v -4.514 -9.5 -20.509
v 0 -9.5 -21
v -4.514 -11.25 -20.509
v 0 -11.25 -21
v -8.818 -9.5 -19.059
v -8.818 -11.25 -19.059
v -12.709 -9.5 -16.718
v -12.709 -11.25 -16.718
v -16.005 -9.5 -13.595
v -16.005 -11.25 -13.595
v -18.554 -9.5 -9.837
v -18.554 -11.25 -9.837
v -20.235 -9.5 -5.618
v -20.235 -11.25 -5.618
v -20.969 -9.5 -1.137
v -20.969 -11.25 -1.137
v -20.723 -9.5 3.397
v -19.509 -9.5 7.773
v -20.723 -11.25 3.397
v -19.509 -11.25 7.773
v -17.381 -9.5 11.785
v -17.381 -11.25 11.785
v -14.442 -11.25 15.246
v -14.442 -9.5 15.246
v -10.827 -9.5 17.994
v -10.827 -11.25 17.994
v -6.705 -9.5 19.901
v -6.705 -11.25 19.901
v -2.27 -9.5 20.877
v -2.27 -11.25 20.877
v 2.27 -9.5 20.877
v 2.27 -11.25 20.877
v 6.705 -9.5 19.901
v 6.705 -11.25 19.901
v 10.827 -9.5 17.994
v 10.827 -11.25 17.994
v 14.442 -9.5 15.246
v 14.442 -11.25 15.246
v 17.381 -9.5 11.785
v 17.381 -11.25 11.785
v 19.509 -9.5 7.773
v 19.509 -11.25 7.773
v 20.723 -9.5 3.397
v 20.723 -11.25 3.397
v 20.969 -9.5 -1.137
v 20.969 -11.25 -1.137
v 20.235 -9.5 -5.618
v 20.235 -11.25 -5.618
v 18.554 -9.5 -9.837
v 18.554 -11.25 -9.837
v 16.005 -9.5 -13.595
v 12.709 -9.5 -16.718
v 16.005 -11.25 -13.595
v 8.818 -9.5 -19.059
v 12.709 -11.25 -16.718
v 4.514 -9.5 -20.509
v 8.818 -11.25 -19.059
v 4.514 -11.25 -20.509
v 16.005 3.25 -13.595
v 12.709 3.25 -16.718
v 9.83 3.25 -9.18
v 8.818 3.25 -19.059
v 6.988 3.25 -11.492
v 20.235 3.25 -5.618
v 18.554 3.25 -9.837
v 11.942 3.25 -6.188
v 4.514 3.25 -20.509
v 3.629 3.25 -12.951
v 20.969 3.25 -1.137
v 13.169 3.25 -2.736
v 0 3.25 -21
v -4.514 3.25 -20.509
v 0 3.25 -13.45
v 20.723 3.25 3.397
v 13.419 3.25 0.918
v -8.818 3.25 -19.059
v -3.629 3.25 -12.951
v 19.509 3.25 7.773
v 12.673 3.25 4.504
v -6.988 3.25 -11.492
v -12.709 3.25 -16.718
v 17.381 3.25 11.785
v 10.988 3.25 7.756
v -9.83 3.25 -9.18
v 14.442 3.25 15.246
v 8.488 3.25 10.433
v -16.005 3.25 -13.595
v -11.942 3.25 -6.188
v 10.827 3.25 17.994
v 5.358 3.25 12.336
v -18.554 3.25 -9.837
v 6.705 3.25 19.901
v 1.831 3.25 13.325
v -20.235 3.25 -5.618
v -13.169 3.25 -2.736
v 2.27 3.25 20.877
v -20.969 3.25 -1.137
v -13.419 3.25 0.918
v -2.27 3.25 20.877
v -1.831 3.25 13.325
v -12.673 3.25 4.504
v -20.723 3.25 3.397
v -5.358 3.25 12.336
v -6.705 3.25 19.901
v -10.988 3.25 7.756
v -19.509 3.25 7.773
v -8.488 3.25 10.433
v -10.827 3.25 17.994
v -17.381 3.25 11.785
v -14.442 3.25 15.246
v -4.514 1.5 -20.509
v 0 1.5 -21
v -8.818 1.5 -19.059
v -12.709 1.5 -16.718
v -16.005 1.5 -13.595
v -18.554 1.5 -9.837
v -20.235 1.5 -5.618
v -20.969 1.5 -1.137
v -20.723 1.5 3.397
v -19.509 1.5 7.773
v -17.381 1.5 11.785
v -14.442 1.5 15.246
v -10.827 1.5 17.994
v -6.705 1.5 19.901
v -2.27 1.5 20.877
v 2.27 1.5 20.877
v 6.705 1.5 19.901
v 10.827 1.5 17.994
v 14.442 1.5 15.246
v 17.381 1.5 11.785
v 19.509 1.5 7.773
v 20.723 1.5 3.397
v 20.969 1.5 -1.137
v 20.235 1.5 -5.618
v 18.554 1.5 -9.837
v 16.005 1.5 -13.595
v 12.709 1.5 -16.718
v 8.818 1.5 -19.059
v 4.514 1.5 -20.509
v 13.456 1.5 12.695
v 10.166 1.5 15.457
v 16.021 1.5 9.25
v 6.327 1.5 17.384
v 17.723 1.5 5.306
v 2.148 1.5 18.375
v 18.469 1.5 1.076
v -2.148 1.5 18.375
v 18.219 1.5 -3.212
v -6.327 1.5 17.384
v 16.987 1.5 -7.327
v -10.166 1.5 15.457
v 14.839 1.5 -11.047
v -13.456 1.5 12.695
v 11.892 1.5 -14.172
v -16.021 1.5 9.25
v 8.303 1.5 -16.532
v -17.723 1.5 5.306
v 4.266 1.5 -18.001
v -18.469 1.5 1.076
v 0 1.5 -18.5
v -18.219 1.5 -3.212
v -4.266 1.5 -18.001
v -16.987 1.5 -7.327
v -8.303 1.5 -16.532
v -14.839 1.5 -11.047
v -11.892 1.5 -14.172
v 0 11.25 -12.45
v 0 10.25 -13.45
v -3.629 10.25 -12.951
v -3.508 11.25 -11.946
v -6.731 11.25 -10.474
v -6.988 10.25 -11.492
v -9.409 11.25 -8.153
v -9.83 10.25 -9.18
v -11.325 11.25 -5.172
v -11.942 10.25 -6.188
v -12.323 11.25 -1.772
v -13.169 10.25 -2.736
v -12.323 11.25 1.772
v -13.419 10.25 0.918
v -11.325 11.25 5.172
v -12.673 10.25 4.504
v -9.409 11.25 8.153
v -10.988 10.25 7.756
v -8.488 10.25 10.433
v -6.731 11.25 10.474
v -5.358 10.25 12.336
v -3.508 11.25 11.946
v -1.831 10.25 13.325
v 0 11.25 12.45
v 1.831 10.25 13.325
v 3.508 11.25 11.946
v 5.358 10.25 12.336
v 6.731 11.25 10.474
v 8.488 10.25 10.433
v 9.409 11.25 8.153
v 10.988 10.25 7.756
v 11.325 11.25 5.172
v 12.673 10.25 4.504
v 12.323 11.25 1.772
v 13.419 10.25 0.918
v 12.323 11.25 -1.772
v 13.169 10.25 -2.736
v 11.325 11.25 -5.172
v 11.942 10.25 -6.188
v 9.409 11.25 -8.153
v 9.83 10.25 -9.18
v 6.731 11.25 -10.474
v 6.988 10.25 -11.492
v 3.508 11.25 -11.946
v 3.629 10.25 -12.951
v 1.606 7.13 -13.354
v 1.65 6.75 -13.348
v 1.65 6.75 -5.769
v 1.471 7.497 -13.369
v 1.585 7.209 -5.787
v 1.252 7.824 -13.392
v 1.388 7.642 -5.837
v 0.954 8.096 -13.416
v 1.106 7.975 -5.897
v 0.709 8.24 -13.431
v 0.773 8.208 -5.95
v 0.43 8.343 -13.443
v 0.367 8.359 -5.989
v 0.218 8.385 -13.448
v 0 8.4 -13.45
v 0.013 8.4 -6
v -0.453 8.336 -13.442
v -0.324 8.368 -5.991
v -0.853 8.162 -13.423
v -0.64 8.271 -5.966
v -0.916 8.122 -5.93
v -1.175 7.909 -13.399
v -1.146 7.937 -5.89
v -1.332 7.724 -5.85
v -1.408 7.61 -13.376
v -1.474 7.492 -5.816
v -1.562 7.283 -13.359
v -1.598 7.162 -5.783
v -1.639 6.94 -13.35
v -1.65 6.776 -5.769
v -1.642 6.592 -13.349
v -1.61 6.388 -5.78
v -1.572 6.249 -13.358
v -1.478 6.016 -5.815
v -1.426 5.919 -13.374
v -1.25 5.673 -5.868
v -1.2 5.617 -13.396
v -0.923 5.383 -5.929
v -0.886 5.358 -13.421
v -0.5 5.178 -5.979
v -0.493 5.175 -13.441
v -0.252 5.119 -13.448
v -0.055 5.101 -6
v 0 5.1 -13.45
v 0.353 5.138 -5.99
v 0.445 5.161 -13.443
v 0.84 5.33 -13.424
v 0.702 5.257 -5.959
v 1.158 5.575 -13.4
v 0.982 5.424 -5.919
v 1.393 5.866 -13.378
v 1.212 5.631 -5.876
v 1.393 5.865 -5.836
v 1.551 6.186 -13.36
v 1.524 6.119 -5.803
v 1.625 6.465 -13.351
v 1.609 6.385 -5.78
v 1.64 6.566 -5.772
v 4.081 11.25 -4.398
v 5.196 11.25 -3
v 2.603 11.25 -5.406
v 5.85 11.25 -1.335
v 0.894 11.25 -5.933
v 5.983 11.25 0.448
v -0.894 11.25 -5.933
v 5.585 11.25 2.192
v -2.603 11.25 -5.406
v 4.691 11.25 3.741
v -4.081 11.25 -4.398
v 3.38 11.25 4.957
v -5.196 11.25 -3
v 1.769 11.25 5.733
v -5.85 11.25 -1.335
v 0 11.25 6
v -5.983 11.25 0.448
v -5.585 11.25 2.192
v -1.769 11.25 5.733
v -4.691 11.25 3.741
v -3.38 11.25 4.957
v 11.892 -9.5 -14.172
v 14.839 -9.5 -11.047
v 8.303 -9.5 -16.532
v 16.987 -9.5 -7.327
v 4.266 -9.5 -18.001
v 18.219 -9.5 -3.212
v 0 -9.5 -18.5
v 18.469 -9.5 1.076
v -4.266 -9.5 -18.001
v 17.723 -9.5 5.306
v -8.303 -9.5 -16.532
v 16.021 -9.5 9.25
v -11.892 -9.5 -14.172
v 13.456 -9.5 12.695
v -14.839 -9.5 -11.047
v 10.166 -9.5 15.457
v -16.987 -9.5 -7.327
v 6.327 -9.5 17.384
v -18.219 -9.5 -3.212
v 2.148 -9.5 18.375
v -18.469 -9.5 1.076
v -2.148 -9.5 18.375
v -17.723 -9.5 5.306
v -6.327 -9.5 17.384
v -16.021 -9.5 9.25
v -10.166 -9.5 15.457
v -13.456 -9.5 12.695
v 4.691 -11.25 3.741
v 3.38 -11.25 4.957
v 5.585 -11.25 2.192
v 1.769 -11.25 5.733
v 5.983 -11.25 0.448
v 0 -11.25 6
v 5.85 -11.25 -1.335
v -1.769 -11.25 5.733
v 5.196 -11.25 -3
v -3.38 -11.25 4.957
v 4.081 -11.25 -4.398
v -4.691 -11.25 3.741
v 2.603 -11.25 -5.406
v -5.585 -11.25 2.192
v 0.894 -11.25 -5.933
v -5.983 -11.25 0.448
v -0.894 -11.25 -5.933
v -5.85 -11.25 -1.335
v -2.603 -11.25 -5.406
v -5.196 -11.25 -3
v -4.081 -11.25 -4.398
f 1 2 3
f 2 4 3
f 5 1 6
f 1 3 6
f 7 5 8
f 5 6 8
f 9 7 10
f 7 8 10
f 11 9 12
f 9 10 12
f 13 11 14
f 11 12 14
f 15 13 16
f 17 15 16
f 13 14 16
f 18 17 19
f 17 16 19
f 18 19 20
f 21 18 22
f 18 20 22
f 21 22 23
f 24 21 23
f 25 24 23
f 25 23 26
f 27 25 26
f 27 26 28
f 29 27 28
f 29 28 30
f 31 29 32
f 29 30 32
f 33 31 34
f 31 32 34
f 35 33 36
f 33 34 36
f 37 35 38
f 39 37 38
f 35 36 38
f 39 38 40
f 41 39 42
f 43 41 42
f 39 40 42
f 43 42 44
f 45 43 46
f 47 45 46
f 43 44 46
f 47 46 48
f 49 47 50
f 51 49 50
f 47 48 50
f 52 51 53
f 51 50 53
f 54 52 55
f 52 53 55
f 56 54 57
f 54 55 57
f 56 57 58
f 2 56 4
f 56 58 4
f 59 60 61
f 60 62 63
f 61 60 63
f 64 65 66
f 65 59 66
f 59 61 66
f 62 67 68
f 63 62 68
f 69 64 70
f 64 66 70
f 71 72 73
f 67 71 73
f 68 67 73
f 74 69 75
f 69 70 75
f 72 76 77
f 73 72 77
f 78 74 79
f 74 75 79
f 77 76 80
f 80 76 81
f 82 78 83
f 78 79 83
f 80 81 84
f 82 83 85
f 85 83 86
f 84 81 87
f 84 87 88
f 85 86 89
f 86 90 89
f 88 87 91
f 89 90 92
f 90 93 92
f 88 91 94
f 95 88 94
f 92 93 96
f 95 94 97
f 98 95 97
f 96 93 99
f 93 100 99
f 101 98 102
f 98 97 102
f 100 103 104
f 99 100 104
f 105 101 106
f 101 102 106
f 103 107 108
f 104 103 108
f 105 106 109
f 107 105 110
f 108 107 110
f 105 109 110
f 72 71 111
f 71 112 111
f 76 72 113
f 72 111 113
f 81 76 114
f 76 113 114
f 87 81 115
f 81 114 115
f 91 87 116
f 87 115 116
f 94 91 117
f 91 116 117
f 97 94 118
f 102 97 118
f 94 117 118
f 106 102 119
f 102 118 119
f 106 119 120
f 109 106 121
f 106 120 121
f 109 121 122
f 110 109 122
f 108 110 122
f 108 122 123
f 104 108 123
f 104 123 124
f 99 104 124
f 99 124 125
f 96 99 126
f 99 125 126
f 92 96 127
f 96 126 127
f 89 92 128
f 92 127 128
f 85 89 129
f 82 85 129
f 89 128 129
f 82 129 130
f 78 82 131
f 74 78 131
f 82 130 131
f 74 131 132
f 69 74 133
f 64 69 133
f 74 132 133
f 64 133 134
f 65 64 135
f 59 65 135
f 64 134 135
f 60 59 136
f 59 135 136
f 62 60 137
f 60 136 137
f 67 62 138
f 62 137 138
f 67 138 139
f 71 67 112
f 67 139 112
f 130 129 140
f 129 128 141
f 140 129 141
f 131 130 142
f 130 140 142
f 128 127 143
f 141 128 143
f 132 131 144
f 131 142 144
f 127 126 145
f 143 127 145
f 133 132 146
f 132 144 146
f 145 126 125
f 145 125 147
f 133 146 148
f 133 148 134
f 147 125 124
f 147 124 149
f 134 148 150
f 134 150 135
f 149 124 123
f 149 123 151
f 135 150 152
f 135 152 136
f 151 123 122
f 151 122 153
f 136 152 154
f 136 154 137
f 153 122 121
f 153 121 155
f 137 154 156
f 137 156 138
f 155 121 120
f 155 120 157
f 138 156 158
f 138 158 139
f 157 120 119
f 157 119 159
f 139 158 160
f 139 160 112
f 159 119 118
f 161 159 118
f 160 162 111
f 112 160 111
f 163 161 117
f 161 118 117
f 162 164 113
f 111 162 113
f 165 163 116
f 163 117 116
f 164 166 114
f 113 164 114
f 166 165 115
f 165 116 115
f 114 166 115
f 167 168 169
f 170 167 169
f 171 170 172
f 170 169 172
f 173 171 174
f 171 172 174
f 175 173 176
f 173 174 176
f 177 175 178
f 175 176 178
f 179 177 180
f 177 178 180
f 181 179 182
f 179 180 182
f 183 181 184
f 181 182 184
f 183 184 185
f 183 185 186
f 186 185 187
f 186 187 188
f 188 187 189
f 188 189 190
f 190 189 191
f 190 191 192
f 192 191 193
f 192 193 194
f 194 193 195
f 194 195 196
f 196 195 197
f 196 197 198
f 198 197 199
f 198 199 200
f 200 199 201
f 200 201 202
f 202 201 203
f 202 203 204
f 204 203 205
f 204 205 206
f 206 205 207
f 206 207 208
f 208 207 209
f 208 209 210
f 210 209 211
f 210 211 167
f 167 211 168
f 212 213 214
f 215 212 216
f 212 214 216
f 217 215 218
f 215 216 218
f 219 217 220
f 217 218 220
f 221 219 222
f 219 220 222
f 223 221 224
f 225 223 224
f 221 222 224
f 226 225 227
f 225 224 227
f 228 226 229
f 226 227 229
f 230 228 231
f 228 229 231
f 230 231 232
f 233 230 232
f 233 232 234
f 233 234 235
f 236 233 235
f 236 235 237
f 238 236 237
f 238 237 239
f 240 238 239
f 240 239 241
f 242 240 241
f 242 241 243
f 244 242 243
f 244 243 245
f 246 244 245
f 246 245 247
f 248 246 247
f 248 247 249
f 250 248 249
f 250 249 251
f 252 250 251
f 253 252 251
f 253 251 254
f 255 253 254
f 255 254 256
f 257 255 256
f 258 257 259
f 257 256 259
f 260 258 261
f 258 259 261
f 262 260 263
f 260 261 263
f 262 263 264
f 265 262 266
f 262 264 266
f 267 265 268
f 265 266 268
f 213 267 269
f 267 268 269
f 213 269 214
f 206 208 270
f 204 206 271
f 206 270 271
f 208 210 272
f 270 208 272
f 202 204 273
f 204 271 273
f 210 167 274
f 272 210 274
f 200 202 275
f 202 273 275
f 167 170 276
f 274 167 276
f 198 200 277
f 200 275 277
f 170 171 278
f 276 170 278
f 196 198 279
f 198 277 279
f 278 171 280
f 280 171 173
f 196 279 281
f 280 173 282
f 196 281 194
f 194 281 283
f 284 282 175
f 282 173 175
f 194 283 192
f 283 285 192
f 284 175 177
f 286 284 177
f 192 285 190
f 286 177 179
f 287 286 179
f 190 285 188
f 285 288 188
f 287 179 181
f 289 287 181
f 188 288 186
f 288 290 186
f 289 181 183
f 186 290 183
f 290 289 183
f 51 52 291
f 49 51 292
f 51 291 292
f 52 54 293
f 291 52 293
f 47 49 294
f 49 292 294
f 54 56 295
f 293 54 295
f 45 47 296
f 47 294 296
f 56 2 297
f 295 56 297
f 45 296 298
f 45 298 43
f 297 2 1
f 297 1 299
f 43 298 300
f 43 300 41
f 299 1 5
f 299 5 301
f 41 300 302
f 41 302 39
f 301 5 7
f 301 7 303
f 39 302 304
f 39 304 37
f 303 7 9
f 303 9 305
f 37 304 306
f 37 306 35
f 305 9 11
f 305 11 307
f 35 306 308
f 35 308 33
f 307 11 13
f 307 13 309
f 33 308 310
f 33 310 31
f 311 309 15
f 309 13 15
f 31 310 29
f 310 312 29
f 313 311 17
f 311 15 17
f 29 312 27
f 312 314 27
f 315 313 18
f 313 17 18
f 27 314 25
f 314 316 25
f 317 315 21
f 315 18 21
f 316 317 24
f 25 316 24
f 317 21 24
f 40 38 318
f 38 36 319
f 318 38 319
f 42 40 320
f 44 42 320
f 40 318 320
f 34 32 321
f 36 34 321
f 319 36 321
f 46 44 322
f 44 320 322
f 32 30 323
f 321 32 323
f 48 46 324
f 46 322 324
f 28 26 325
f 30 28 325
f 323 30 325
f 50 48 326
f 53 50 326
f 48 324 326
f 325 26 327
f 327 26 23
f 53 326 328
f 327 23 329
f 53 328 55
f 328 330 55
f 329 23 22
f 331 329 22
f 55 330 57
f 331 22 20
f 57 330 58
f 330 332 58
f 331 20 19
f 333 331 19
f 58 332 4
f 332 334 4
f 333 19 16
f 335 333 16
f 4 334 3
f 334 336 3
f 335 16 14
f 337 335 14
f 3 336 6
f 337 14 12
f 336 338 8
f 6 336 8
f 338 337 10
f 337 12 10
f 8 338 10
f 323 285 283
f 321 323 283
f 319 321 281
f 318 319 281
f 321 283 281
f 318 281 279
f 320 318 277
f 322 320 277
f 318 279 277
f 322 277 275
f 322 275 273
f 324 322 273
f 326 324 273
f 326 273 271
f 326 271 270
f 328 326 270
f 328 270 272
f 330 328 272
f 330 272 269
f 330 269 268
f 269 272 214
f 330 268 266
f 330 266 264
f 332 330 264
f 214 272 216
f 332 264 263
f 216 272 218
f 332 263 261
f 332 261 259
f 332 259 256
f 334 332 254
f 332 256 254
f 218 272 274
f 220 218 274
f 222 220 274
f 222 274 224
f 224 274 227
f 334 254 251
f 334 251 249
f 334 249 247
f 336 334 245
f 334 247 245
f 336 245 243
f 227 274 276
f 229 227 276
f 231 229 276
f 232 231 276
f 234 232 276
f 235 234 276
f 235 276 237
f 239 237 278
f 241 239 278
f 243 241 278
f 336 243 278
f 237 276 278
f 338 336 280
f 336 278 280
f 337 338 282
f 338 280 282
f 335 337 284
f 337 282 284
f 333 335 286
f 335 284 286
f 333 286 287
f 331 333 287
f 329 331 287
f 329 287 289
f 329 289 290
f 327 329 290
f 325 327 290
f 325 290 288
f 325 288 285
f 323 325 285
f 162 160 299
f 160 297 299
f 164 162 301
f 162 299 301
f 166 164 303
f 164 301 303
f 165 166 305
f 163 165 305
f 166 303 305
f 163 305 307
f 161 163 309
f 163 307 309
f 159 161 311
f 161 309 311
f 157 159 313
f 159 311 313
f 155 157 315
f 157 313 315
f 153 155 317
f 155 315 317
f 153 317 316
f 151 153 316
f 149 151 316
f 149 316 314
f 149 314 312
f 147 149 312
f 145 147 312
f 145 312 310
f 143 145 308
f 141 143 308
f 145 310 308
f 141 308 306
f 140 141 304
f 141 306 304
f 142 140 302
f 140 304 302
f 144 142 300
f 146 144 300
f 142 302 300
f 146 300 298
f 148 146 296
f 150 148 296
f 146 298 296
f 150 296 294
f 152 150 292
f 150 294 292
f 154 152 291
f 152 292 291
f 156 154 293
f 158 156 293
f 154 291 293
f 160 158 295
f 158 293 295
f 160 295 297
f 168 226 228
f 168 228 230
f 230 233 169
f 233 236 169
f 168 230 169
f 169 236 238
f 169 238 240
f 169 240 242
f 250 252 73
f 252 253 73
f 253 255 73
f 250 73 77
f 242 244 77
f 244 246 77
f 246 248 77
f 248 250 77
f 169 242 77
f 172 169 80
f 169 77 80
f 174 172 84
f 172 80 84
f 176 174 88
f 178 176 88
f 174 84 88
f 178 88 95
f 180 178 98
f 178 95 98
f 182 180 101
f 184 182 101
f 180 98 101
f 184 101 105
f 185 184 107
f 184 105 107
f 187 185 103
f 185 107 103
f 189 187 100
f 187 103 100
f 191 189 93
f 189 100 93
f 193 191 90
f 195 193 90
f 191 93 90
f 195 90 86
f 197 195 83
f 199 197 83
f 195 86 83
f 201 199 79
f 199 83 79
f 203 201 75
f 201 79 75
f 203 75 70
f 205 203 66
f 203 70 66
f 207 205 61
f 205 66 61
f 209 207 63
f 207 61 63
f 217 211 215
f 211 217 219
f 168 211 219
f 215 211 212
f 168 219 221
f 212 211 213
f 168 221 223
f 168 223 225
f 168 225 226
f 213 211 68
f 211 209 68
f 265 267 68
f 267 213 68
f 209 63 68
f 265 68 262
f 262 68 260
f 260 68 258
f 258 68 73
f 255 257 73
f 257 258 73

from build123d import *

# Parameters (mm, degrees)
SMUSSO1_SIZE             = 1
SCHIZZO2_R               = 6
TAGLIO_ESTRUSIONE1_DEPTH = 38.259227045
SCHIZZO3_R               = 1.65
TAGLIO_ESTRUSIONE2_DEPTH = 32.75787304


with BuildPart() as part:
    # Schizzo1 → Rivoluzione1 (revolve)
    with BuildSketch(Plane.XY, mode=Mode.PRIVATE) as rivoluzione1_sk:
        Polygon((0, 11.25), (13.45, 11.25), (13.45, 3.25), (21, 3.25), (21, 1.5), (18.5, 1.5), (18.5, -9.5), (21, -9.5), (21, -11.25), (0, -11.25), align=None)
    revolve(rivoluzione1_sk.sketch.rotate(Axis((0, -12.375, 0), (0, 1, 0)), 90), axis=Axis((0, -12.375, 0), (0, 1, 0)))

    # Smusso1
    smusso1_edges = [part.edges().sort_by_distance(p)[0] for p in [
        (0, 11.25, 13.45),
    ]]
    chamfer(smusso1_edges, length=SMUSSO1_SIZE)

    # Schizzo2 → Taglio-Estrusione1 (cut, through all)
    with BuildSketch(Plane(origin=(0, 11.25, 0), x_dir=(1, 0, 0), z_dir=(0, 1, 0))):
        with Locations(Location((0, 0, 0), (0, 0, 270))):
            Circle(SCHIZZO2_R)
    extrude(amount=-TAGLIO_ESTRUSIONE1_DEPTH, mode=Mode.SUBTRACT)

    # Schizzo3 → Taglio-Estrusione2 (cut, through all)
    with BuildSketch(Plane.XY):
        with Locations((0, 6.75)):
            Circle(SCHIZZO3_R)
    extrude(amount=-TAGLIO_ESTRUSIONE2_DEPTH, mode=Mode.SUBTRACT)


solid = part.part
